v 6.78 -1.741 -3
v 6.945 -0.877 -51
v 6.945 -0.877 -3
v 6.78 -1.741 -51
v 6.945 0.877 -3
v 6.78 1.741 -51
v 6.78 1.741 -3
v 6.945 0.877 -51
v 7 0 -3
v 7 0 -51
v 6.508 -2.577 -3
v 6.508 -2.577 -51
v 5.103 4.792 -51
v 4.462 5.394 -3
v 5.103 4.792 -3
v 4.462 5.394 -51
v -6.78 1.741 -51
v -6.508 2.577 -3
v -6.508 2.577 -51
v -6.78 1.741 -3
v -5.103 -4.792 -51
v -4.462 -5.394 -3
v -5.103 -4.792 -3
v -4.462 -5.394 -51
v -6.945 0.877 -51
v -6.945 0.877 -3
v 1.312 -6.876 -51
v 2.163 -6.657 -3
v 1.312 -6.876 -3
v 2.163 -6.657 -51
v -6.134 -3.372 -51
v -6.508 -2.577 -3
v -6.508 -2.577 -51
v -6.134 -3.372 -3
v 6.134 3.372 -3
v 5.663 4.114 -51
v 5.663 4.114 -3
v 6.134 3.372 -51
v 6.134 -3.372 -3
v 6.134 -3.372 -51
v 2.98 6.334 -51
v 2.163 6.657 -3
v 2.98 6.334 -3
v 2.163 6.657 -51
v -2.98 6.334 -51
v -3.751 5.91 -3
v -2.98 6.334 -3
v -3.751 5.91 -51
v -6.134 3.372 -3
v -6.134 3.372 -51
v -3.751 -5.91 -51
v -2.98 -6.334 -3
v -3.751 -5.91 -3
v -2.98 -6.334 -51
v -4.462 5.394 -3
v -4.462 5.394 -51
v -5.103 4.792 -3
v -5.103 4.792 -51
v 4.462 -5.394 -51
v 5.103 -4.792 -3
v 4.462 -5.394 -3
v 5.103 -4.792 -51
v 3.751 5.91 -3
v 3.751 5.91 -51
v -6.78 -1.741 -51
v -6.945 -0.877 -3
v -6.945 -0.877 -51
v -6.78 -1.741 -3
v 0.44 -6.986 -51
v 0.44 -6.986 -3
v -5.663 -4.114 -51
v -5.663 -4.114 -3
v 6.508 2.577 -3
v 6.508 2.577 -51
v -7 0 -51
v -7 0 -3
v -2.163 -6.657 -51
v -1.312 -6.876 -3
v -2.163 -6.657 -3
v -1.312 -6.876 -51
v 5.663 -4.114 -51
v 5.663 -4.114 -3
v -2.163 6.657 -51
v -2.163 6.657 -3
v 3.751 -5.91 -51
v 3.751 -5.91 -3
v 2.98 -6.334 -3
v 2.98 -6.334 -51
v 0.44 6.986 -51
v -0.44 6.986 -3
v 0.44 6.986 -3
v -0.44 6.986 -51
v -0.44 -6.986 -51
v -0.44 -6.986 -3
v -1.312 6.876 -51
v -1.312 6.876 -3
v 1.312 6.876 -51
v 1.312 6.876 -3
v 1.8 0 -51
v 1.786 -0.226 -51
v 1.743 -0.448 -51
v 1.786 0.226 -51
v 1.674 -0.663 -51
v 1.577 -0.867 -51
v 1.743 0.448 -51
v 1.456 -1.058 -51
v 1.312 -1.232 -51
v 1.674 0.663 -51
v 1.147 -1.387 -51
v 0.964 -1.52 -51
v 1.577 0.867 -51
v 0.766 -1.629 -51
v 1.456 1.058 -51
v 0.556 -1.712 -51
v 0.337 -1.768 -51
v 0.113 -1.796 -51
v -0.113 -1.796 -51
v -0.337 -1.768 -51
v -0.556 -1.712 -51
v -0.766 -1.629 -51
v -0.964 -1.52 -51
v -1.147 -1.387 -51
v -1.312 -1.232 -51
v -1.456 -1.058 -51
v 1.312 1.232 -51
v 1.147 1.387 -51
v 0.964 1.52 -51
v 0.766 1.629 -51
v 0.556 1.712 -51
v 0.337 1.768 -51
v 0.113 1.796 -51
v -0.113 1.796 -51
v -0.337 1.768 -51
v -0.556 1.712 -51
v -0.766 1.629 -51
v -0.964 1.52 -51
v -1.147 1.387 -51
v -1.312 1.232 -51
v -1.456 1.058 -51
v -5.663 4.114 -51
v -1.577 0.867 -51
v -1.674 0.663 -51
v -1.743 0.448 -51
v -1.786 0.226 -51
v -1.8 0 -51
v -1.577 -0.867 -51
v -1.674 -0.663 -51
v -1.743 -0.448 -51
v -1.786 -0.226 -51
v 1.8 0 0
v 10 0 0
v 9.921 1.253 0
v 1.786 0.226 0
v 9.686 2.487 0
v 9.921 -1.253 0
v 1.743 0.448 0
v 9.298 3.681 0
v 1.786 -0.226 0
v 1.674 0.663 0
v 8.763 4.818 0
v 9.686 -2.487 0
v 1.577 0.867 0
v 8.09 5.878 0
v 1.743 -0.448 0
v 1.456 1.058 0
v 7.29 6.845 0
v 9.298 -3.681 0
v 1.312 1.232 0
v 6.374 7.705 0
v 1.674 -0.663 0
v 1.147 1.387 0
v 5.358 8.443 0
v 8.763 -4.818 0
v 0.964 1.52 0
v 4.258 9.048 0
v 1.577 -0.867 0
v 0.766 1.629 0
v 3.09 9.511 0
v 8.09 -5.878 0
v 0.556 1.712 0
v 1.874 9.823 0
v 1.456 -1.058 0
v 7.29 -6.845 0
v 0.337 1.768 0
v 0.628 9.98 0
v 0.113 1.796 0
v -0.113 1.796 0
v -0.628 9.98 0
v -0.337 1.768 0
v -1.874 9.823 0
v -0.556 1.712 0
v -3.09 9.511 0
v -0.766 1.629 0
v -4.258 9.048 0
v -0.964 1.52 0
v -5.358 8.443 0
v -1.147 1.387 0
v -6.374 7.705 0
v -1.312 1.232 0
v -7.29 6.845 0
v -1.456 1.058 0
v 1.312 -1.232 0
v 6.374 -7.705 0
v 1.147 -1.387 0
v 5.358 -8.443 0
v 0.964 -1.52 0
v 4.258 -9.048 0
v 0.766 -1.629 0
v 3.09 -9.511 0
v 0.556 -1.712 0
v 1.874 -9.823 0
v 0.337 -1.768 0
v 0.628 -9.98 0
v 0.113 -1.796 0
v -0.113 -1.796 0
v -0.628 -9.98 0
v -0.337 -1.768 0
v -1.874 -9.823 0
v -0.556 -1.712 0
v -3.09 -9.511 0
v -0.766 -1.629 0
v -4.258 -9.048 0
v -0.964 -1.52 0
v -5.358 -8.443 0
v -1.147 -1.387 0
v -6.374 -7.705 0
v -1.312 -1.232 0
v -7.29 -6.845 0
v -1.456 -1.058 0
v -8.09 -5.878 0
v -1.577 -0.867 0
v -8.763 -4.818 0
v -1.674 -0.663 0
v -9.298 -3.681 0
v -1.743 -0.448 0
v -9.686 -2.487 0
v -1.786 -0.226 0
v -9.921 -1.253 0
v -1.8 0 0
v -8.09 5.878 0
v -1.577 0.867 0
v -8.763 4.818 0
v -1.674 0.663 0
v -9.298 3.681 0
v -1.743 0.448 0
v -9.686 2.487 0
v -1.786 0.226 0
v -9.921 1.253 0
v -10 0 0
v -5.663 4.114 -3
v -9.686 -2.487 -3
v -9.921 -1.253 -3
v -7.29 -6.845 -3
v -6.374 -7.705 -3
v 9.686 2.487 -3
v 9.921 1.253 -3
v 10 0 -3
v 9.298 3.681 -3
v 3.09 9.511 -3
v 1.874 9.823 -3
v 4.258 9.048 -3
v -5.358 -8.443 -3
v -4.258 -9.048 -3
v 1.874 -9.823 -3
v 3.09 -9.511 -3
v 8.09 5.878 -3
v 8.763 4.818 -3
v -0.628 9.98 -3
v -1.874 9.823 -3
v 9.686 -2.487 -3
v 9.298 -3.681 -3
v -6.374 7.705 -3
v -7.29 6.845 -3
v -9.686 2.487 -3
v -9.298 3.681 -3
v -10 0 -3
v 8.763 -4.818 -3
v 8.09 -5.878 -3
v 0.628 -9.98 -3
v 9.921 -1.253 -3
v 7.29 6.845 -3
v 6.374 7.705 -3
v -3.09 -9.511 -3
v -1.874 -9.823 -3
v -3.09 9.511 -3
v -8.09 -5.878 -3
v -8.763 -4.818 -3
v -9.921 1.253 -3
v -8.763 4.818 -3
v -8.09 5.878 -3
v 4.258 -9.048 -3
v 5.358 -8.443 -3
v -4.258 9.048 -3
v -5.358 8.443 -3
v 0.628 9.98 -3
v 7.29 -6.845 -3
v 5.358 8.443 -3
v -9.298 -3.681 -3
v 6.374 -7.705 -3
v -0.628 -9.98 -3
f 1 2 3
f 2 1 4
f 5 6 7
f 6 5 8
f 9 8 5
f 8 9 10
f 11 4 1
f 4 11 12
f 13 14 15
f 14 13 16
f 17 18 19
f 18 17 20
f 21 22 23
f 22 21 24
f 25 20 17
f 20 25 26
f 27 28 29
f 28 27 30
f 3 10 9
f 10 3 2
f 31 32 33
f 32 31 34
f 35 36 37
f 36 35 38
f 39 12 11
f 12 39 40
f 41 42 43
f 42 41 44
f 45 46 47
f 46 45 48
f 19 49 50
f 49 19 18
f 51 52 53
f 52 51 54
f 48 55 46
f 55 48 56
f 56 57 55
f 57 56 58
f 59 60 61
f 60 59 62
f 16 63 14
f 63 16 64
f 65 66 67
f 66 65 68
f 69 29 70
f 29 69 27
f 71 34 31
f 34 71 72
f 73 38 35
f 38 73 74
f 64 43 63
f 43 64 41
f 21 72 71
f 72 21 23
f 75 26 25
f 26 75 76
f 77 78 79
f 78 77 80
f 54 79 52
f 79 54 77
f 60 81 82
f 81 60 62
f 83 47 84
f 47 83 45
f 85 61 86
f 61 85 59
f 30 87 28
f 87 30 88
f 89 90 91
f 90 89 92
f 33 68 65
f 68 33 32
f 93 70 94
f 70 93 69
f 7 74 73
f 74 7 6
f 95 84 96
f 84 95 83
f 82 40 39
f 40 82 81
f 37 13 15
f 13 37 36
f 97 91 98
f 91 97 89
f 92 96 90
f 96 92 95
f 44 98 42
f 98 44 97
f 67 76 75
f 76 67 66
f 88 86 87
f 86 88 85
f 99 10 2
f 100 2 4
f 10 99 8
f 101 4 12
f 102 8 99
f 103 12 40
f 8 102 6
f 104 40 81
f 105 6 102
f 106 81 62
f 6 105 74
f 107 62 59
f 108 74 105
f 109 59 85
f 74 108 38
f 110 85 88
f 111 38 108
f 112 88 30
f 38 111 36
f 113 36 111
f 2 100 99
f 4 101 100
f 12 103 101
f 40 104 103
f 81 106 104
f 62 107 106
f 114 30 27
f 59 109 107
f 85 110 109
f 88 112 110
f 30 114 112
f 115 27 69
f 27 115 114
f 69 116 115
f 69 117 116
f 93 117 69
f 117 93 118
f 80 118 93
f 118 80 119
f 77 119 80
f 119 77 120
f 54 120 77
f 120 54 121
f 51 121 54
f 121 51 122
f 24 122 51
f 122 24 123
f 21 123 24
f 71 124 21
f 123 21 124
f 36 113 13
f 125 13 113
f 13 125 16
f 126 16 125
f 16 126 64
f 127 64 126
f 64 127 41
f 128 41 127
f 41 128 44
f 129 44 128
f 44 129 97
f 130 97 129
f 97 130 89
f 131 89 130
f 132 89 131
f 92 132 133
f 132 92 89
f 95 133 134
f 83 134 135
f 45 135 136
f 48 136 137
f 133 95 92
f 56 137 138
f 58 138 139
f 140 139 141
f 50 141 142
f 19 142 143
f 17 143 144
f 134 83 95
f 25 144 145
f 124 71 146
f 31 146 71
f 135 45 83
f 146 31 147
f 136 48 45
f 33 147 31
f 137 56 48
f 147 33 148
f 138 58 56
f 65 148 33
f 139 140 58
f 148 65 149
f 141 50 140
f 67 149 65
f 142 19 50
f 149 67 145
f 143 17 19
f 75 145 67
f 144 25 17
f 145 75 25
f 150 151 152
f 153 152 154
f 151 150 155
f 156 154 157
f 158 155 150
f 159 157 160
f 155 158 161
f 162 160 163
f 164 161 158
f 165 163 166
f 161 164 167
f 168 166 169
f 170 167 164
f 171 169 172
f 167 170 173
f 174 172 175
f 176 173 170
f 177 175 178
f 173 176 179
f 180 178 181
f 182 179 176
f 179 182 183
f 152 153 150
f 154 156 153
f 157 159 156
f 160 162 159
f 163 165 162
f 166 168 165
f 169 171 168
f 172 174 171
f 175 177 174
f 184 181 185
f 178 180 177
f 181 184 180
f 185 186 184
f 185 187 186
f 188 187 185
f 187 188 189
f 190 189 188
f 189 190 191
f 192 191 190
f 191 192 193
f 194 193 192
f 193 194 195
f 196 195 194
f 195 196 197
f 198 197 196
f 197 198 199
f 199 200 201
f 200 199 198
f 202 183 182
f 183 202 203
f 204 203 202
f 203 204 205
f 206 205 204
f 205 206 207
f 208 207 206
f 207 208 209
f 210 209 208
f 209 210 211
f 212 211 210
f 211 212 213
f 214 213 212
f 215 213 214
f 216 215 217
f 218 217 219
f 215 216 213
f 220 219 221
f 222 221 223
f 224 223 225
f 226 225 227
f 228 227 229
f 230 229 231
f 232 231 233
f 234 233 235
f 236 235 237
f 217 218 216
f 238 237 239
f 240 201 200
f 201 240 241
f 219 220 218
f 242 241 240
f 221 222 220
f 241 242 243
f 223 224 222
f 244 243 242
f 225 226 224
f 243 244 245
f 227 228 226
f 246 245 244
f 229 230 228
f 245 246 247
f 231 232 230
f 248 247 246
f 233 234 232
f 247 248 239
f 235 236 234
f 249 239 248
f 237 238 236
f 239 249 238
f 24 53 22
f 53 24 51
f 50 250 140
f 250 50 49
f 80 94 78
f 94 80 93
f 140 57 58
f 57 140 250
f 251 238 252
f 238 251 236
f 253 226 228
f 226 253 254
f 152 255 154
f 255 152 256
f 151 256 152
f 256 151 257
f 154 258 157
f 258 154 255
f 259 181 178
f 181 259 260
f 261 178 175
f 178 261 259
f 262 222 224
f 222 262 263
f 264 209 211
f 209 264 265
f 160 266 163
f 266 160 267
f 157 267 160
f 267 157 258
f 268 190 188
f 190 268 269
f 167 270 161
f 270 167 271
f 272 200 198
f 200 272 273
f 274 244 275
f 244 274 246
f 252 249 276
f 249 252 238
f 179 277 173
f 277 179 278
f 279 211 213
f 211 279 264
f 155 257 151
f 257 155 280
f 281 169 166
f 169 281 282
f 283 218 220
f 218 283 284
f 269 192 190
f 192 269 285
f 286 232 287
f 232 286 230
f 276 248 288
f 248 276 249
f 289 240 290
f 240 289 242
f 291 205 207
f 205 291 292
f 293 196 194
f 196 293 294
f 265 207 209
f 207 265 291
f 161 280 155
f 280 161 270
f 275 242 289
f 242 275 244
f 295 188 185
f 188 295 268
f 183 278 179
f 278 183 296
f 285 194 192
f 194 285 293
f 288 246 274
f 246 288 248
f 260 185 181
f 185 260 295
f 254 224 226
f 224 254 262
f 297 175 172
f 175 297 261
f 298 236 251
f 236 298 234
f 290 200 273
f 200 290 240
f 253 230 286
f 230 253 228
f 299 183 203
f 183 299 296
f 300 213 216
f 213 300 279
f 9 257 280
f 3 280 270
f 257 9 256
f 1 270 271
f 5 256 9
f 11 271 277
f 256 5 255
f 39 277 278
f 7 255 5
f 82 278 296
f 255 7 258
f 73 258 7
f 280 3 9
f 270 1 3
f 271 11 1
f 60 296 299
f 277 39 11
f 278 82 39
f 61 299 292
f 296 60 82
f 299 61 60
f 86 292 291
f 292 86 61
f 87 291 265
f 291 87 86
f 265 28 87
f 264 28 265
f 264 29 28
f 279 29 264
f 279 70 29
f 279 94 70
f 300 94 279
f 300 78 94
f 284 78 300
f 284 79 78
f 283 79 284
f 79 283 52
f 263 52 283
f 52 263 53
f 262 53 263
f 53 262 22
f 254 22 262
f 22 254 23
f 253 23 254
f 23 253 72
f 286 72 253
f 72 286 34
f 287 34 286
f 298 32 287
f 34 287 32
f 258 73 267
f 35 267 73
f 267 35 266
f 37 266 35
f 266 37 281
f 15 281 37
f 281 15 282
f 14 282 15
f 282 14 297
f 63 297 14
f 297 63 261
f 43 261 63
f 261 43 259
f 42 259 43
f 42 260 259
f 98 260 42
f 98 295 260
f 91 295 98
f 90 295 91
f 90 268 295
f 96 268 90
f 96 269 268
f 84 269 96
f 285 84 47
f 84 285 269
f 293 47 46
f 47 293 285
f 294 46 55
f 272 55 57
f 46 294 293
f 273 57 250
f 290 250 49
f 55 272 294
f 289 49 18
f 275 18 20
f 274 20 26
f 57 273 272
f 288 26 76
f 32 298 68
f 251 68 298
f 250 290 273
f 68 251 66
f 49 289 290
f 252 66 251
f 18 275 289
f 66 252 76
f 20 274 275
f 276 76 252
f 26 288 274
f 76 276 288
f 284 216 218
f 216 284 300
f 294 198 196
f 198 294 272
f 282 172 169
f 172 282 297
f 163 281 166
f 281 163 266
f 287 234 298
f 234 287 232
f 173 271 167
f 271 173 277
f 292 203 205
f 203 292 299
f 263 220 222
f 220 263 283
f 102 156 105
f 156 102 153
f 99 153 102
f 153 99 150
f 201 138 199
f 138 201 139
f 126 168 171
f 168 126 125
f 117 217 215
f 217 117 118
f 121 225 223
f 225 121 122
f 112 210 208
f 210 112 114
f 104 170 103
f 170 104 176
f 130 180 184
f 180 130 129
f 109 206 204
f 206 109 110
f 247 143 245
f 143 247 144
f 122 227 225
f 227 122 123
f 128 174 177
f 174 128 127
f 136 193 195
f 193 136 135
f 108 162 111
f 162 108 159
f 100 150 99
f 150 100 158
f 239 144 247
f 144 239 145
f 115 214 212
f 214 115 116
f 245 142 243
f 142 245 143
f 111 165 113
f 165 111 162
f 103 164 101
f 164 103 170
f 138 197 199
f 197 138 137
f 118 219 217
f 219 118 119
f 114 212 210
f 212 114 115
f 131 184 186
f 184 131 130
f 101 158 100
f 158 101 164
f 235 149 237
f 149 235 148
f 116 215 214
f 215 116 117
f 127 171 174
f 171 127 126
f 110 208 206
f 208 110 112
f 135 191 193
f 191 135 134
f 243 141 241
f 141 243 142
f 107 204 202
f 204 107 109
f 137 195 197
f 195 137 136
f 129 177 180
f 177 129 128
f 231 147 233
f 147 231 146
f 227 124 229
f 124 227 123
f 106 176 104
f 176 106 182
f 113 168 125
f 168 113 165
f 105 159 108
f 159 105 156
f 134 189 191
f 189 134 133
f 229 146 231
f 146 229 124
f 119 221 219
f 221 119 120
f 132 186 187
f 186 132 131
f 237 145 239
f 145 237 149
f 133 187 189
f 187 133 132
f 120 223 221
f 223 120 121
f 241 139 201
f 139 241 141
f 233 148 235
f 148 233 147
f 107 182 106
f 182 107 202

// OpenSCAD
$fn = 50;


difference() {
	union() {
		translate(v = [0, 0, -51.0000000000]) {
			cylinder(h = 51, r = 7.0000000000);
		}
		translate(v = [0, 0, -3.0000000000]) {
			cylinder(h = 3, r = 10.0000000000);
		}
	}
	union() {
		#translate(v = [0, 0, -51]) {
			cylinder(h = 51, r = 1.8000000000);
		}
	}
}
